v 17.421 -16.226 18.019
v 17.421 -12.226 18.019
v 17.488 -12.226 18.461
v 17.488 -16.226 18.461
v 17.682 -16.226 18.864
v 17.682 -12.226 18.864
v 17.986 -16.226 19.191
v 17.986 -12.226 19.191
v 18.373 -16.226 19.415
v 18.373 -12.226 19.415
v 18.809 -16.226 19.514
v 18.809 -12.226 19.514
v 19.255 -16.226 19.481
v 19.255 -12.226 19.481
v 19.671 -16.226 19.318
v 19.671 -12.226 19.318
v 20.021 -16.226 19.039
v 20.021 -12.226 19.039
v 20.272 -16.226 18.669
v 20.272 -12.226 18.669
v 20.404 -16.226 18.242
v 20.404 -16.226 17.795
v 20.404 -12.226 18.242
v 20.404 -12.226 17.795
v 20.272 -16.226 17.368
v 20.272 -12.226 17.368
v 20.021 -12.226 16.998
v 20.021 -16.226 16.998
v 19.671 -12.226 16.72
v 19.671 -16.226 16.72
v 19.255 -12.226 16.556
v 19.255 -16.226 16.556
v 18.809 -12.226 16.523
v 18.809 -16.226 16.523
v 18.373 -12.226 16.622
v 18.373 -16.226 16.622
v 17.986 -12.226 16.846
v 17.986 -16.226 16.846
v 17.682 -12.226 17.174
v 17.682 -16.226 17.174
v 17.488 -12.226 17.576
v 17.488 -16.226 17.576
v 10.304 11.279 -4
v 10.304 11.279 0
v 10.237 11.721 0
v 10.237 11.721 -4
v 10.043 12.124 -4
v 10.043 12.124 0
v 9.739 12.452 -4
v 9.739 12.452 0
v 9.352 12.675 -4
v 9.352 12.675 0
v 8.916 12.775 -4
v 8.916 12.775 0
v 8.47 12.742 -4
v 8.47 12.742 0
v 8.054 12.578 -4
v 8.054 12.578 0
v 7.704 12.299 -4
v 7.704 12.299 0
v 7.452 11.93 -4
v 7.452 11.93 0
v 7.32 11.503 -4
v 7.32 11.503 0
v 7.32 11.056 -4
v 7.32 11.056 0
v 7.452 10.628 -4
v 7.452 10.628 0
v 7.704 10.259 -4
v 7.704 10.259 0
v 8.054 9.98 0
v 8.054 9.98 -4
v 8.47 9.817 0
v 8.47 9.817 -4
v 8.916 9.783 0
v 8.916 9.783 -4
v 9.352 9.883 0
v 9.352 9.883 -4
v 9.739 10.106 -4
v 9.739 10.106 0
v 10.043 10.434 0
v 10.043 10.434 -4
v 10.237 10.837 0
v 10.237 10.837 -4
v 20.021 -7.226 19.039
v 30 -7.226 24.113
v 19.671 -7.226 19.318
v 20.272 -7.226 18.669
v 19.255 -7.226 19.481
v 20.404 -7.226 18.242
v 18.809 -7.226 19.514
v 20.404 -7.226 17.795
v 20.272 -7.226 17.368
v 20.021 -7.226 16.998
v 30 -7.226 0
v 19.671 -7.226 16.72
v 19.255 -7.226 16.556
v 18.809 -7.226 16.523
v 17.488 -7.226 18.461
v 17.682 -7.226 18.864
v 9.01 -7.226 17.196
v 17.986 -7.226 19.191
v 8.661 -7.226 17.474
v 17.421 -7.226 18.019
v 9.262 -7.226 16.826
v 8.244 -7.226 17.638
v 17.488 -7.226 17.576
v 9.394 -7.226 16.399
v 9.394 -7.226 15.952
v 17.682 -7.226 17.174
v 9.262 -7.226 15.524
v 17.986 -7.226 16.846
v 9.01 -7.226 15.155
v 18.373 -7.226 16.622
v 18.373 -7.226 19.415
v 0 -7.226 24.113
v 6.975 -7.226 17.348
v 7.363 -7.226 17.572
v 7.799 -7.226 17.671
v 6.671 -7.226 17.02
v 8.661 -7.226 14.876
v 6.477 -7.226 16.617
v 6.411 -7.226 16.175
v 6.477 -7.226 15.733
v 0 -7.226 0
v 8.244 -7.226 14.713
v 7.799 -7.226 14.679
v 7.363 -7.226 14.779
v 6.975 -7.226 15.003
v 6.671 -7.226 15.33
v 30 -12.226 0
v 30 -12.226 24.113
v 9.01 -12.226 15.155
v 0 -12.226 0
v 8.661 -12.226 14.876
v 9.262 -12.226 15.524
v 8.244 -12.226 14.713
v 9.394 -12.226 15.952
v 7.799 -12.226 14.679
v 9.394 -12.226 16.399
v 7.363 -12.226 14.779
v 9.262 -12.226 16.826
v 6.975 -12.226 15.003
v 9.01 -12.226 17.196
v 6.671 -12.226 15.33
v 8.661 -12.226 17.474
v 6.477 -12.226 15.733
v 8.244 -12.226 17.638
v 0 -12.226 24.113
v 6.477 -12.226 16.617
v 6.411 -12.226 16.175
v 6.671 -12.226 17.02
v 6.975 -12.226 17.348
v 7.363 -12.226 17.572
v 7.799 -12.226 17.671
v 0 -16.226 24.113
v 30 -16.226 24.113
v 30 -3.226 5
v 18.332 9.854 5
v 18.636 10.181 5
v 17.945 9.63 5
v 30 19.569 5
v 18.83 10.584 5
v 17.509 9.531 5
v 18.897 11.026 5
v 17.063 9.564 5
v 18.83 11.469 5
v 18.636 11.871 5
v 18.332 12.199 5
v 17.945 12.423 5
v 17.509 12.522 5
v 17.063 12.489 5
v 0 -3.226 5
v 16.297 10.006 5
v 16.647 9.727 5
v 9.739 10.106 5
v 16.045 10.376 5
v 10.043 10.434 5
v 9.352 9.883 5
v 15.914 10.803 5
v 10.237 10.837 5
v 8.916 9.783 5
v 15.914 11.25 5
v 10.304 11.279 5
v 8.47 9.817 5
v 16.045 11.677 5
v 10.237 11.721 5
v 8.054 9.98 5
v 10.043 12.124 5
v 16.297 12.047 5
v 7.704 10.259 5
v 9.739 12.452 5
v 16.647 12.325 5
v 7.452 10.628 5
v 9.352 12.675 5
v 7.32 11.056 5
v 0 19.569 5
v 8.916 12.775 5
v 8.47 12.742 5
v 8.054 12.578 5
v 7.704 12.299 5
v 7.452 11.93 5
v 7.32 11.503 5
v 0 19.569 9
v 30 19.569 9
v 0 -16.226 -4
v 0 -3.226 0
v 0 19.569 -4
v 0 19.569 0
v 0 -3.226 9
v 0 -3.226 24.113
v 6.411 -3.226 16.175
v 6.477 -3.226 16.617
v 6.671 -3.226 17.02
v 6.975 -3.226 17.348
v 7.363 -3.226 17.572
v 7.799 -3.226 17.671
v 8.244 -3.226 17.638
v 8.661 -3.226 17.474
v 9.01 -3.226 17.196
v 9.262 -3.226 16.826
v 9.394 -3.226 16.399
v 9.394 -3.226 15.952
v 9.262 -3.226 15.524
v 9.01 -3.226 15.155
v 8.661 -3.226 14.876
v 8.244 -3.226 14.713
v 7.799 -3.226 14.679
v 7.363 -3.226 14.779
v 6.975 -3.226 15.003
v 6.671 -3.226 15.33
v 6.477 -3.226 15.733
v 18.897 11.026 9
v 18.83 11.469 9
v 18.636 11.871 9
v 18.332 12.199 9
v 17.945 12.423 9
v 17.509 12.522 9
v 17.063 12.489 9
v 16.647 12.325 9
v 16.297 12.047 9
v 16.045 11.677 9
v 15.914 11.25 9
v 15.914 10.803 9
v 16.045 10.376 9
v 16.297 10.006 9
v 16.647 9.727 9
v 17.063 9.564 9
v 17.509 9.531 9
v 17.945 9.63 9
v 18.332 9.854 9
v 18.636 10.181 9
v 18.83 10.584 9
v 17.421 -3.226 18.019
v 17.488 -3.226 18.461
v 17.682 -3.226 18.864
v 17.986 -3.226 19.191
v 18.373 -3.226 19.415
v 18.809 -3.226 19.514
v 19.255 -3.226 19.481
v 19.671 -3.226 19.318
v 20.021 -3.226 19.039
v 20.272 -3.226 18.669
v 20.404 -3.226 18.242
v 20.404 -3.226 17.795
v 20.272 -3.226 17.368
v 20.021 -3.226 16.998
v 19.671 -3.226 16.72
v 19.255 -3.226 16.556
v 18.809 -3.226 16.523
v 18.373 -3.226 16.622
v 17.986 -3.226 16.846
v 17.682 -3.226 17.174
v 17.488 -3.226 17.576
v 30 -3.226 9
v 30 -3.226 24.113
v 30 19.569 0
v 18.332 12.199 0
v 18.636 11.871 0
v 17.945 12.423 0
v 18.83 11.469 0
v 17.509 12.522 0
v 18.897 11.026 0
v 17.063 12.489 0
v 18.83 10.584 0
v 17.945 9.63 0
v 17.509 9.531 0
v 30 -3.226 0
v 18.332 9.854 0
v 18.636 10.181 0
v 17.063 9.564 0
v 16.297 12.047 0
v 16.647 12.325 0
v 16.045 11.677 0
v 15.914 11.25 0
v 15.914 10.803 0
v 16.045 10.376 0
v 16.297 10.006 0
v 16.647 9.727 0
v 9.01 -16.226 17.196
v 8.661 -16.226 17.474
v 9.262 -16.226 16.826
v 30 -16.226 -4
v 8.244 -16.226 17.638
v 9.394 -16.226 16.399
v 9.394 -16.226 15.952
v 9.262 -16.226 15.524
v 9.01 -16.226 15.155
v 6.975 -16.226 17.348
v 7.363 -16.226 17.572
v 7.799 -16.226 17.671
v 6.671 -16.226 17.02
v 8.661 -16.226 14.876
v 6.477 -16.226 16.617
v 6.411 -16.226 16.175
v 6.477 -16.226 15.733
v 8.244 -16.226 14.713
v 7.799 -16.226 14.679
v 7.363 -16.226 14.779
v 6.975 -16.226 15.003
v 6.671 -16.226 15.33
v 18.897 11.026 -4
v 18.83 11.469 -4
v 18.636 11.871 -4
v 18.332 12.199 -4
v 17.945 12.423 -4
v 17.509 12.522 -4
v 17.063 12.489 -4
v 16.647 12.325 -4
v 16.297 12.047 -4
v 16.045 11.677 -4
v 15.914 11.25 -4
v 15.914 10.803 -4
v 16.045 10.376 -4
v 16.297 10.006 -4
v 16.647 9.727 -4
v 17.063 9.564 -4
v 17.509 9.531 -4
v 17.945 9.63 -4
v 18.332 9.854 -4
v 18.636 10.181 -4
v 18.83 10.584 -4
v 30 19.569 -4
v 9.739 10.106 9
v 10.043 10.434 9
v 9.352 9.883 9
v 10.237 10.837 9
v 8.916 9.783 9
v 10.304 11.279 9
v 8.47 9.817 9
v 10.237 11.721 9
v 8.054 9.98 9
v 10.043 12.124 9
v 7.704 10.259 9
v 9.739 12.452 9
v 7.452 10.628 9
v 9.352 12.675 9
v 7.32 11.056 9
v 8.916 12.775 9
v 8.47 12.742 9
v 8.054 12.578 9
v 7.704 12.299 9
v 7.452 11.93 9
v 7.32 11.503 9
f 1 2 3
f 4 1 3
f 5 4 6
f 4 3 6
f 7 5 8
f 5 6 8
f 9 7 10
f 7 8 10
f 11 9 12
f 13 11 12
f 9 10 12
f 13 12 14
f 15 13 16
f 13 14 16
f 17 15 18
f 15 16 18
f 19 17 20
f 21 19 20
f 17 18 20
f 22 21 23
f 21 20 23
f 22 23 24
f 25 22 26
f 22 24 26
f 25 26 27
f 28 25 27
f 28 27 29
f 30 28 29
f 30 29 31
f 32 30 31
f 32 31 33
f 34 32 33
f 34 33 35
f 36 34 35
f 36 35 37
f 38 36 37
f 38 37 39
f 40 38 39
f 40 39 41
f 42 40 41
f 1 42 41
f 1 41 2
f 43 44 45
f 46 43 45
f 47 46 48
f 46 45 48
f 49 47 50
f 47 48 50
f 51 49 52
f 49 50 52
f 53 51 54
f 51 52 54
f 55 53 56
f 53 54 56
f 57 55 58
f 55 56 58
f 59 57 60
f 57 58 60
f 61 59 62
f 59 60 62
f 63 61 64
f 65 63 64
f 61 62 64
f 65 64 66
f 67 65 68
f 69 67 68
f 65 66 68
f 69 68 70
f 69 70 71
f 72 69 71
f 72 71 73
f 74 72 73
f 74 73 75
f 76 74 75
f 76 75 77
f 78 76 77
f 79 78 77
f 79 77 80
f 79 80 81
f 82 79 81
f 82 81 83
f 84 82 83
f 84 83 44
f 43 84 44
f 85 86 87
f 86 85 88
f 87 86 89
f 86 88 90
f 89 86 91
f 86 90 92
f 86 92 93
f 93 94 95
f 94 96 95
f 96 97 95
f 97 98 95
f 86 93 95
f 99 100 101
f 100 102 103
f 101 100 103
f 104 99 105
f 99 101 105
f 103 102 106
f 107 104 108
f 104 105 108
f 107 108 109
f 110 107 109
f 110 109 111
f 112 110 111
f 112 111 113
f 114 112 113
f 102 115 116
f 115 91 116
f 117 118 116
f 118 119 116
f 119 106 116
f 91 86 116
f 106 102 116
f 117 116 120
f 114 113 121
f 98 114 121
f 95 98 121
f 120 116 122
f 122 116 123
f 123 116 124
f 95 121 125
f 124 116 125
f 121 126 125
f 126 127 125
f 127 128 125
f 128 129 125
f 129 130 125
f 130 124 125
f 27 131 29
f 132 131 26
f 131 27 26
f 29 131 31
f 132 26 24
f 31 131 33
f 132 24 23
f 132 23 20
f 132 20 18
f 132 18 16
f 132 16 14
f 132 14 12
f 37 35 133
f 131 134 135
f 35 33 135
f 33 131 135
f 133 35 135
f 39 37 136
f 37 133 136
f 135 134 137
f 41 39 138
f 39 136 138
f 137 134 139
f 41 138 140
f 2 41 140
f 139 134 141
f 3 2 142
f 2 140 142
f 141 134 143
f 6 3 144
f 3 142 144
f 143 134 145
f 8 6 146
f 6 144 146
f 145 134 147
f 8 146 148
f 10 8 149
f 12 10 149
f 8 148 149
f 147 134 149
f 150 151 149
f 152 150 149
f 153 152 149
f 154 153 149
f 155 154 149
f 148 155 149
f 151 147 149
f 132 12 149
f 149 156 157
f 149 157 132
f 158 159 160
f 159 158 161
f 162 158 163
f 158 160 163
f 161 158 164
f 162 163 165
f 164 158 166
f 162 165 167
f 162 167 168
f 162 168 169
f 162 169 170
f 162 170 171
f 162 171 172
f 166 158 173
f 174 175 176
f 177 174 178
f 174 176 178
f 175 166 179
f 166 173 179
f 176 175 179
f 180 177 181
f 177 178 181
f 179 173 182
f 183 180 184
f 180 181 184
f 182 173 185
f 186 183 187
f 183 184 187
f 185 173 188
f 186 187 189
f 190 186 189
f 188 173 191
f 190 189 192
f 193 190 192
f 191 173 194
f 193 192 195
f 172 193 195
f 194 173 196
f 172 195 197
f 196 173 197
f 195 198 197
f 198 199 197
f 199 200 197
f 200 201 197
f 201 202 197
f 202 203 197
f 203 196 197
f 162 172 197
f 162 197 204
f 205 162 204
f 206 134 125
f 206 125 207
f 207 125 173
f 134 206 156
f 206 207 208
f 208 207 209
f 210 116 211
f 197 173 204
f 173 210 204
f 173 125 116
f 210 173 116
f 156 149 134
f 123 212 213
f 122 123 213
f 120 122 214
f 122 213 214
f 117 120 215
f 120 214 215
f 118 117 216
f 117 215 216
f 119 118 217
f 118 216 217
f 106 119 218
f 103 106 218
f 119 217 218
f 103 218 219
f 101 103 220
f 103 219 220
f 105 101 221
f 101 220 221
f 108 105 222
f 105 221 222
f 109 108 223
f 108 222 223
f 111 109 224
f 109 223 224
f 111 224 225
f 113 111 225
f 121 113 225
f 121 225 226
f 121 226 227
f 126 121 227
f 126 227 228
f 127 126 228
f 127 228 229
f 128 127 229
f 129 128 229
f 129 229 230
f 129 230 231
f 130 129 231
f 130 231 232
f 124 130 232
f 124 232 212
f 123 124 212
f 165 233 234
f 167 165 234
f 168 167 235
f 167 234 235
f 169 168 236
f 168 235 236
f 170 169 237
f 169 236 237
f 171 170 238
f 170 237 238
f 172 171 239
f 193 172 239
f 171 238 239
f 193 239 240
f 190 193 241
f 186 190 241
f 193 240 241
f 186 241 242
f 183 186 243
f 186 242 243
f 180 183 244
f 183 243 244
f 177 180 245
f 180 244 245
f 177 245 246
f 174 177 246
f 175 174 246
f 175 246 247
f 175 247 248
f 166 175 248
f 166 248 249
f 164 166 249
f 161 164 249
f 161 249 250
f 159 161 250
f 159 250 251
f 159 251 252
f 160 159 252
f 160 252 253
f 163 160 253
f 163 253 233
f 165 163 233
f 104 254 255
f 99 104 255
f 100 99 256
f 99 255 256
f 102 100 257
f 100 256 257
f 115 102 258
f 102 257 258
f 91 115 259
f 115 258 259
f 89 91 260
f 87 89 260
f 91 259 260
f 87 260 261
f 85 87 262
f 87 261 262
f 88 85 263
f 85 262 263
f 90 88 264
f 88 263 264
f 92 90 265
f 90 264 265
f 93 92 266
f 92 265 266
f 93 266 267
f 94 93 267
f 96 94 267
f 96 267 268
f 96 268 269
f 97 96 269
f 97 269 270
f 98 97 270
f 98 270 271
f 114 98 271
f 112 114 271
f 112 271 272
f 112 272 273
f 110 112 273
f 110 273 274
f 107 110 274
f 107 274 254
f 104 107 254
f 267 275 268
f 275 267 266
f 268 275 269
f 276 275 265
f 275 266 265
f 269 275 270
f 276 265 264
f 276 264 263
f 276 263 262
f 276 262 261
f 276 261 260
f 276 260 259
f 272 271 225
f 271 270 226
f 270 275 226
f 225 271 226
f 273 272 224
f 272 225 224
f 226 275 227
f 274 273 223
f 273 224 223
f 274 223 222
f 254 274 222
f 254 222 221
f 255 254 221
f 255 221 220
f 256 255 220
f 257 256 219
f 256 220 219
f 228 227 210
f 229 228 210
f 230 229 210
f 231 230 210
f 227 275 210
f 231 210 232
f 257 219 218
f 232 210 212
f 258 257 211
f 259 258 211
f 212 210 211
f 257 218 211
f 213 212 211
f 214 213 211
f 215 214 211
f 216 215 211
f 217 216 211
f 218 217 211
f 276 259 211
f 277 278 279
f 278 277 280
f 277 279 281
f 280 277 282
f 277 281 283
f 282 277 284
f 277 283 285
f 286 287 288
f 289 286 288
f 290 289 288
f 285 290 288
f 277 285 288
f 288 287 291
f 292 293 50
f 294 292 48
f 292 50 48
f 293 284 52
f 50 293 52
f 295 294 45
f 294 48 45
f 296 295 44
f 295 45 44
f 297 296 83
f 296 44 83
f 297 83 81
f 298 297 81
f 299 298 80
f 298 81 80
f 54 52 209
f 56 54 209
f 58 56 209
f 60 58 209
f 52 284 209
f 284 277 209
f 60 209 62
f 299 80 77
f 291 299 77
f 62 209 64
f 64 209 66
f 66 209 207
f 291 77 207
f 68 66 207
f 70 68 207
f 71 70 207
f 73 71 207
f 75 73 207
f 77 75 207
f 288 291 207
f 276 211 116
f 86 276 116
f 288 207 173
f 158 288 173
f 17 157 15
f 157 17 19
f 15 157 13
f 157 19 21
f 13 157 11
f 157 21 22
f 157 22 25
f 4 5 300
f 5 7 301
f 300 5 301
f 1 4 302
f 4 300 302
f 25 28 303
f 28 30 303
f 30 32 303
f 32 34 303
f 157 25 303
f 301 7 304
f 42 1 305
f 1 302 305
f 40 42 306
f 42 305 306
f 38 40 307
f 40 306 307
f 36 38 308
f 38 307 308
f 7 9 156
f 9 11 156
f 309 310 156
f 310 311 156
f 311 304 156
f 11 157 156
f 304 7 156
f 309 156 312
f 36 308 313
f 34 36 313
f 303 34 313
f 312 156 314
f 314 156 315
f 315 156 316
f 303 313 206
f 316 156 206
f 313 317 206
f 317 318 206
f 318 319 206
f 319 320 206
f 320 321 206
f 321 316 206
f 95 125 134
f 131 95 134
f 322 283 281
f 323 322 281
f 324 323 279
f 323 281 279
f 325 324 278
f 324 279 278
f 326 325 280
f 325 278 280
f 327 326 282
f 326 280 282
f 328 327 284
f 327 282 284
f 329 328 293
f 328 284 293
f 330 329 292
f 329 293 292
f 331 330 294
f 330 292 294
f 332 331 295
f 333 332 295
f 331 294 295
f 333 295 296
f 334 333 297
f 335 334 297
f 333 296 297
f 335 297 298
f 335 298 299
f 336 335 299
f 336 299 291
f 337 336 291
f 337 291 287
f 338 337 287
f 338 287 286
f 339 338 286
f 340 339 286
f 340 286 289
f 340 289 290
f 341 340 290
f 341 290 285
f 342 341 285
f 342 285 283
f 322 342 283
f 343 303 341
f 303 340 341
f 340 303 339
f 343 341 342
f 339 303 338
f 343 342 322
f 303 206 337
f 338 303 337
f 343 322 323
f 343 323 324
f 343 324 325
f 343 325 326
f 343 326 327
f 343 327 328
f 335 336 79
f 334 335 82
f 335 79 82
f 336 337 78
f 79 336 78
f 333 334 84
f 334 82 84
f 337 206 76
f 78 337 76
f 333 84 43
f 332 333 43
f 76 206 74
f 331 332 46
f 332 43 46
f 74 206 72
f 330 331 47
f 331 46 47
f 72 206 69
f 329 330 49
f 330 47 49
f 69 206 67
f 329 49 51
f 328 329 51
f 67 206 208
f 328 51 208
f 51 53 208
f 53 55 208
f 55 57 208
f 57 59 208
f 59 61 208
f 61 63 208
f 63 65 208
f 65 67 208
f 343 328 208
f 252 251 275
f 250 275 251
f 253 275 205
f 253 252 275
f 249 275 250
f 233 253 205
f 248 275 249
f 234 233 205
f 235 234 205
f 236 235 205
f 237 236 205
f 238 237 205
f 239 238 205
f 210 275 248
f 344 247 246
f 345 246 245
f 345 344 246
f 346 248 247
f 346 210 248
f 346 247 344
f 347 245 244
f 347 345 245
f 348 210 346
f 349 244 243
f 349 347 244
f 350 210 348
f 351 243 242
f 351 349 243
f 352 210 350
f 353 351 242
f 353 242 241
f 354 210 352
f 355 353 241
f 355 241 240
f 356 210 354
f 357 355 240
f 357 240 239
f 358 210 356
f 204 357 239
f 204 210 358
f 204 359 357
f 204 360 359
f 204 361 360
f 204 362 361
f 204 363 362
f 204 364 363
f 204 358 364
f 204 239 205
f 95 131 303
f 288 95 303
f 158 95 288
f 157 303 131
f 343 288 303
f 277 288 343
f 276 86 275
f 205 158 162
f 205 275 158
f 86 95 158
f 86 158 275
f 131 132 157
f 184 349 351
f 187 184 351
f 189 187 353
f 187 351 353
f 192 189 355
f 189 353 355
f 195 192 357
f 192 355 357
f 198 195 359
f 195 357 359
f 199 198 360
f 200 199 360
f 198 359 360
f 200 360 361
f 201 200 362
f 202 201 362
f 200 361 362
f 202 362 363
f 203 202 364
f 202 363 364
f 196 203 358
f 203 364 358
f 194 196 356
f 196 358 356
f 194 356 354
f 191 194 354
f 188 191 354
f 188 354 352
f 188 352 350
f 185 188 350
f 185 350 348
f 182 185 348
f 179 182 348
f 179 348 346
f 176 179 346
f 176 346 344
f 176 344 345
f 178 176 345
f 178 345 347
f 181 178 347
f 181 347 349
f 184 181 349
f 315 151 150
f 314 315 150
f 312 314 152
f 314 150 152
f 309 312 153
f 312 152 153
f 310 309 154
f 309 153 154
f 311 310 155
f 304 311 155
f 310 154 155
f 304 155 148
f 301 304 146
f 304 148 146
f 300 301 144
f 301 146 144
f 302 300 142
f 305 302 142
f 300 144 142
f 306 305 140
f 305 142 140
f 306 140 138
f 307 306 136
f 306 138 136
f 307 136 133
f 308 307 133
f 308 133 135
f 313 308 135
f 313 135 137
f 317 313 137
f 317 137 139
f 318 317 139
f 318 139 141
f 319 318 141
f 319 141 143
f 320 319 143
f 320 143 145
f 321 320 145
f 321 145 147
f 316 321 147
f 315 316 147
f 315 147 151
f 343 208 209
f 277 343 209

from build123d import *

# Parameters (mm, degrees)
F0_W     = 4
F0_H     = 24.11321
F0_W_2   = 22.79535
F0_H_2   = 4
F0_W_3   = 17.79535
F1_DEPTH = 30
F2_R     = 1.5
F3_DEPTH = 25
F4_R     = 1.5
F5_DEPTH = 25


with BuildPart() as f1:
    # F0 (on Right) → F1 (new body)
    with BuildSketch(Plane.YZ):
        with Locations((-14.226417, 12.056605)):
            Rectangle(F0_W, F0_H)
        with Locations((8.171258, 7)):
            Rectangle(F0_W_2, F0_H_2)
        with Locations((10.671258, -2)):
            Rectangle(F0_W_3, F0_H_2)
        Polygon((1.773583, -4), (1.773583, 0), (-3.226417, 0), (-7.226417, 0), (-12.226417, 0), (-16.226417, 0), (-16.226417, -4), align=None)
        Polygon((-7.226417, 0), (-3.226417, 0), (-3.226417, 5), (-3.226417, 9), (-3.226417, 24.11321), (-7.226417, 24.11321), align=None)
    extrude(amount=F1_DEPTH)

    # F2 (on face) → F3 (cut)
    with BuildSketch(Plane(origin=(0, -3.226417, 0), x_dir=(-1, 0, 0), z_dir=(0, 1, 0))):
        with Locations((-18.920988, 18.018588)):
            Circle(F2_R)
        with Locations((-7.910667, 16.17527)):
            Circle(F2_R)
    extrude(amount=-F3_DEPTH, mode=Mode.SUBTRACT)

    # F4 (on face) → F5 (cut)
    with BuildSketch(Plane.XY.offset(9)):
        with Locations((8.8035, 11.279188)):
            Circle(F4_R)
        with Locations((17.396833, 11.026443)):
            Circle(F4_R)
    extrude(amount=-F5_DEPTH, mode=Mode.SUBTRACT)


solid = f1.part
